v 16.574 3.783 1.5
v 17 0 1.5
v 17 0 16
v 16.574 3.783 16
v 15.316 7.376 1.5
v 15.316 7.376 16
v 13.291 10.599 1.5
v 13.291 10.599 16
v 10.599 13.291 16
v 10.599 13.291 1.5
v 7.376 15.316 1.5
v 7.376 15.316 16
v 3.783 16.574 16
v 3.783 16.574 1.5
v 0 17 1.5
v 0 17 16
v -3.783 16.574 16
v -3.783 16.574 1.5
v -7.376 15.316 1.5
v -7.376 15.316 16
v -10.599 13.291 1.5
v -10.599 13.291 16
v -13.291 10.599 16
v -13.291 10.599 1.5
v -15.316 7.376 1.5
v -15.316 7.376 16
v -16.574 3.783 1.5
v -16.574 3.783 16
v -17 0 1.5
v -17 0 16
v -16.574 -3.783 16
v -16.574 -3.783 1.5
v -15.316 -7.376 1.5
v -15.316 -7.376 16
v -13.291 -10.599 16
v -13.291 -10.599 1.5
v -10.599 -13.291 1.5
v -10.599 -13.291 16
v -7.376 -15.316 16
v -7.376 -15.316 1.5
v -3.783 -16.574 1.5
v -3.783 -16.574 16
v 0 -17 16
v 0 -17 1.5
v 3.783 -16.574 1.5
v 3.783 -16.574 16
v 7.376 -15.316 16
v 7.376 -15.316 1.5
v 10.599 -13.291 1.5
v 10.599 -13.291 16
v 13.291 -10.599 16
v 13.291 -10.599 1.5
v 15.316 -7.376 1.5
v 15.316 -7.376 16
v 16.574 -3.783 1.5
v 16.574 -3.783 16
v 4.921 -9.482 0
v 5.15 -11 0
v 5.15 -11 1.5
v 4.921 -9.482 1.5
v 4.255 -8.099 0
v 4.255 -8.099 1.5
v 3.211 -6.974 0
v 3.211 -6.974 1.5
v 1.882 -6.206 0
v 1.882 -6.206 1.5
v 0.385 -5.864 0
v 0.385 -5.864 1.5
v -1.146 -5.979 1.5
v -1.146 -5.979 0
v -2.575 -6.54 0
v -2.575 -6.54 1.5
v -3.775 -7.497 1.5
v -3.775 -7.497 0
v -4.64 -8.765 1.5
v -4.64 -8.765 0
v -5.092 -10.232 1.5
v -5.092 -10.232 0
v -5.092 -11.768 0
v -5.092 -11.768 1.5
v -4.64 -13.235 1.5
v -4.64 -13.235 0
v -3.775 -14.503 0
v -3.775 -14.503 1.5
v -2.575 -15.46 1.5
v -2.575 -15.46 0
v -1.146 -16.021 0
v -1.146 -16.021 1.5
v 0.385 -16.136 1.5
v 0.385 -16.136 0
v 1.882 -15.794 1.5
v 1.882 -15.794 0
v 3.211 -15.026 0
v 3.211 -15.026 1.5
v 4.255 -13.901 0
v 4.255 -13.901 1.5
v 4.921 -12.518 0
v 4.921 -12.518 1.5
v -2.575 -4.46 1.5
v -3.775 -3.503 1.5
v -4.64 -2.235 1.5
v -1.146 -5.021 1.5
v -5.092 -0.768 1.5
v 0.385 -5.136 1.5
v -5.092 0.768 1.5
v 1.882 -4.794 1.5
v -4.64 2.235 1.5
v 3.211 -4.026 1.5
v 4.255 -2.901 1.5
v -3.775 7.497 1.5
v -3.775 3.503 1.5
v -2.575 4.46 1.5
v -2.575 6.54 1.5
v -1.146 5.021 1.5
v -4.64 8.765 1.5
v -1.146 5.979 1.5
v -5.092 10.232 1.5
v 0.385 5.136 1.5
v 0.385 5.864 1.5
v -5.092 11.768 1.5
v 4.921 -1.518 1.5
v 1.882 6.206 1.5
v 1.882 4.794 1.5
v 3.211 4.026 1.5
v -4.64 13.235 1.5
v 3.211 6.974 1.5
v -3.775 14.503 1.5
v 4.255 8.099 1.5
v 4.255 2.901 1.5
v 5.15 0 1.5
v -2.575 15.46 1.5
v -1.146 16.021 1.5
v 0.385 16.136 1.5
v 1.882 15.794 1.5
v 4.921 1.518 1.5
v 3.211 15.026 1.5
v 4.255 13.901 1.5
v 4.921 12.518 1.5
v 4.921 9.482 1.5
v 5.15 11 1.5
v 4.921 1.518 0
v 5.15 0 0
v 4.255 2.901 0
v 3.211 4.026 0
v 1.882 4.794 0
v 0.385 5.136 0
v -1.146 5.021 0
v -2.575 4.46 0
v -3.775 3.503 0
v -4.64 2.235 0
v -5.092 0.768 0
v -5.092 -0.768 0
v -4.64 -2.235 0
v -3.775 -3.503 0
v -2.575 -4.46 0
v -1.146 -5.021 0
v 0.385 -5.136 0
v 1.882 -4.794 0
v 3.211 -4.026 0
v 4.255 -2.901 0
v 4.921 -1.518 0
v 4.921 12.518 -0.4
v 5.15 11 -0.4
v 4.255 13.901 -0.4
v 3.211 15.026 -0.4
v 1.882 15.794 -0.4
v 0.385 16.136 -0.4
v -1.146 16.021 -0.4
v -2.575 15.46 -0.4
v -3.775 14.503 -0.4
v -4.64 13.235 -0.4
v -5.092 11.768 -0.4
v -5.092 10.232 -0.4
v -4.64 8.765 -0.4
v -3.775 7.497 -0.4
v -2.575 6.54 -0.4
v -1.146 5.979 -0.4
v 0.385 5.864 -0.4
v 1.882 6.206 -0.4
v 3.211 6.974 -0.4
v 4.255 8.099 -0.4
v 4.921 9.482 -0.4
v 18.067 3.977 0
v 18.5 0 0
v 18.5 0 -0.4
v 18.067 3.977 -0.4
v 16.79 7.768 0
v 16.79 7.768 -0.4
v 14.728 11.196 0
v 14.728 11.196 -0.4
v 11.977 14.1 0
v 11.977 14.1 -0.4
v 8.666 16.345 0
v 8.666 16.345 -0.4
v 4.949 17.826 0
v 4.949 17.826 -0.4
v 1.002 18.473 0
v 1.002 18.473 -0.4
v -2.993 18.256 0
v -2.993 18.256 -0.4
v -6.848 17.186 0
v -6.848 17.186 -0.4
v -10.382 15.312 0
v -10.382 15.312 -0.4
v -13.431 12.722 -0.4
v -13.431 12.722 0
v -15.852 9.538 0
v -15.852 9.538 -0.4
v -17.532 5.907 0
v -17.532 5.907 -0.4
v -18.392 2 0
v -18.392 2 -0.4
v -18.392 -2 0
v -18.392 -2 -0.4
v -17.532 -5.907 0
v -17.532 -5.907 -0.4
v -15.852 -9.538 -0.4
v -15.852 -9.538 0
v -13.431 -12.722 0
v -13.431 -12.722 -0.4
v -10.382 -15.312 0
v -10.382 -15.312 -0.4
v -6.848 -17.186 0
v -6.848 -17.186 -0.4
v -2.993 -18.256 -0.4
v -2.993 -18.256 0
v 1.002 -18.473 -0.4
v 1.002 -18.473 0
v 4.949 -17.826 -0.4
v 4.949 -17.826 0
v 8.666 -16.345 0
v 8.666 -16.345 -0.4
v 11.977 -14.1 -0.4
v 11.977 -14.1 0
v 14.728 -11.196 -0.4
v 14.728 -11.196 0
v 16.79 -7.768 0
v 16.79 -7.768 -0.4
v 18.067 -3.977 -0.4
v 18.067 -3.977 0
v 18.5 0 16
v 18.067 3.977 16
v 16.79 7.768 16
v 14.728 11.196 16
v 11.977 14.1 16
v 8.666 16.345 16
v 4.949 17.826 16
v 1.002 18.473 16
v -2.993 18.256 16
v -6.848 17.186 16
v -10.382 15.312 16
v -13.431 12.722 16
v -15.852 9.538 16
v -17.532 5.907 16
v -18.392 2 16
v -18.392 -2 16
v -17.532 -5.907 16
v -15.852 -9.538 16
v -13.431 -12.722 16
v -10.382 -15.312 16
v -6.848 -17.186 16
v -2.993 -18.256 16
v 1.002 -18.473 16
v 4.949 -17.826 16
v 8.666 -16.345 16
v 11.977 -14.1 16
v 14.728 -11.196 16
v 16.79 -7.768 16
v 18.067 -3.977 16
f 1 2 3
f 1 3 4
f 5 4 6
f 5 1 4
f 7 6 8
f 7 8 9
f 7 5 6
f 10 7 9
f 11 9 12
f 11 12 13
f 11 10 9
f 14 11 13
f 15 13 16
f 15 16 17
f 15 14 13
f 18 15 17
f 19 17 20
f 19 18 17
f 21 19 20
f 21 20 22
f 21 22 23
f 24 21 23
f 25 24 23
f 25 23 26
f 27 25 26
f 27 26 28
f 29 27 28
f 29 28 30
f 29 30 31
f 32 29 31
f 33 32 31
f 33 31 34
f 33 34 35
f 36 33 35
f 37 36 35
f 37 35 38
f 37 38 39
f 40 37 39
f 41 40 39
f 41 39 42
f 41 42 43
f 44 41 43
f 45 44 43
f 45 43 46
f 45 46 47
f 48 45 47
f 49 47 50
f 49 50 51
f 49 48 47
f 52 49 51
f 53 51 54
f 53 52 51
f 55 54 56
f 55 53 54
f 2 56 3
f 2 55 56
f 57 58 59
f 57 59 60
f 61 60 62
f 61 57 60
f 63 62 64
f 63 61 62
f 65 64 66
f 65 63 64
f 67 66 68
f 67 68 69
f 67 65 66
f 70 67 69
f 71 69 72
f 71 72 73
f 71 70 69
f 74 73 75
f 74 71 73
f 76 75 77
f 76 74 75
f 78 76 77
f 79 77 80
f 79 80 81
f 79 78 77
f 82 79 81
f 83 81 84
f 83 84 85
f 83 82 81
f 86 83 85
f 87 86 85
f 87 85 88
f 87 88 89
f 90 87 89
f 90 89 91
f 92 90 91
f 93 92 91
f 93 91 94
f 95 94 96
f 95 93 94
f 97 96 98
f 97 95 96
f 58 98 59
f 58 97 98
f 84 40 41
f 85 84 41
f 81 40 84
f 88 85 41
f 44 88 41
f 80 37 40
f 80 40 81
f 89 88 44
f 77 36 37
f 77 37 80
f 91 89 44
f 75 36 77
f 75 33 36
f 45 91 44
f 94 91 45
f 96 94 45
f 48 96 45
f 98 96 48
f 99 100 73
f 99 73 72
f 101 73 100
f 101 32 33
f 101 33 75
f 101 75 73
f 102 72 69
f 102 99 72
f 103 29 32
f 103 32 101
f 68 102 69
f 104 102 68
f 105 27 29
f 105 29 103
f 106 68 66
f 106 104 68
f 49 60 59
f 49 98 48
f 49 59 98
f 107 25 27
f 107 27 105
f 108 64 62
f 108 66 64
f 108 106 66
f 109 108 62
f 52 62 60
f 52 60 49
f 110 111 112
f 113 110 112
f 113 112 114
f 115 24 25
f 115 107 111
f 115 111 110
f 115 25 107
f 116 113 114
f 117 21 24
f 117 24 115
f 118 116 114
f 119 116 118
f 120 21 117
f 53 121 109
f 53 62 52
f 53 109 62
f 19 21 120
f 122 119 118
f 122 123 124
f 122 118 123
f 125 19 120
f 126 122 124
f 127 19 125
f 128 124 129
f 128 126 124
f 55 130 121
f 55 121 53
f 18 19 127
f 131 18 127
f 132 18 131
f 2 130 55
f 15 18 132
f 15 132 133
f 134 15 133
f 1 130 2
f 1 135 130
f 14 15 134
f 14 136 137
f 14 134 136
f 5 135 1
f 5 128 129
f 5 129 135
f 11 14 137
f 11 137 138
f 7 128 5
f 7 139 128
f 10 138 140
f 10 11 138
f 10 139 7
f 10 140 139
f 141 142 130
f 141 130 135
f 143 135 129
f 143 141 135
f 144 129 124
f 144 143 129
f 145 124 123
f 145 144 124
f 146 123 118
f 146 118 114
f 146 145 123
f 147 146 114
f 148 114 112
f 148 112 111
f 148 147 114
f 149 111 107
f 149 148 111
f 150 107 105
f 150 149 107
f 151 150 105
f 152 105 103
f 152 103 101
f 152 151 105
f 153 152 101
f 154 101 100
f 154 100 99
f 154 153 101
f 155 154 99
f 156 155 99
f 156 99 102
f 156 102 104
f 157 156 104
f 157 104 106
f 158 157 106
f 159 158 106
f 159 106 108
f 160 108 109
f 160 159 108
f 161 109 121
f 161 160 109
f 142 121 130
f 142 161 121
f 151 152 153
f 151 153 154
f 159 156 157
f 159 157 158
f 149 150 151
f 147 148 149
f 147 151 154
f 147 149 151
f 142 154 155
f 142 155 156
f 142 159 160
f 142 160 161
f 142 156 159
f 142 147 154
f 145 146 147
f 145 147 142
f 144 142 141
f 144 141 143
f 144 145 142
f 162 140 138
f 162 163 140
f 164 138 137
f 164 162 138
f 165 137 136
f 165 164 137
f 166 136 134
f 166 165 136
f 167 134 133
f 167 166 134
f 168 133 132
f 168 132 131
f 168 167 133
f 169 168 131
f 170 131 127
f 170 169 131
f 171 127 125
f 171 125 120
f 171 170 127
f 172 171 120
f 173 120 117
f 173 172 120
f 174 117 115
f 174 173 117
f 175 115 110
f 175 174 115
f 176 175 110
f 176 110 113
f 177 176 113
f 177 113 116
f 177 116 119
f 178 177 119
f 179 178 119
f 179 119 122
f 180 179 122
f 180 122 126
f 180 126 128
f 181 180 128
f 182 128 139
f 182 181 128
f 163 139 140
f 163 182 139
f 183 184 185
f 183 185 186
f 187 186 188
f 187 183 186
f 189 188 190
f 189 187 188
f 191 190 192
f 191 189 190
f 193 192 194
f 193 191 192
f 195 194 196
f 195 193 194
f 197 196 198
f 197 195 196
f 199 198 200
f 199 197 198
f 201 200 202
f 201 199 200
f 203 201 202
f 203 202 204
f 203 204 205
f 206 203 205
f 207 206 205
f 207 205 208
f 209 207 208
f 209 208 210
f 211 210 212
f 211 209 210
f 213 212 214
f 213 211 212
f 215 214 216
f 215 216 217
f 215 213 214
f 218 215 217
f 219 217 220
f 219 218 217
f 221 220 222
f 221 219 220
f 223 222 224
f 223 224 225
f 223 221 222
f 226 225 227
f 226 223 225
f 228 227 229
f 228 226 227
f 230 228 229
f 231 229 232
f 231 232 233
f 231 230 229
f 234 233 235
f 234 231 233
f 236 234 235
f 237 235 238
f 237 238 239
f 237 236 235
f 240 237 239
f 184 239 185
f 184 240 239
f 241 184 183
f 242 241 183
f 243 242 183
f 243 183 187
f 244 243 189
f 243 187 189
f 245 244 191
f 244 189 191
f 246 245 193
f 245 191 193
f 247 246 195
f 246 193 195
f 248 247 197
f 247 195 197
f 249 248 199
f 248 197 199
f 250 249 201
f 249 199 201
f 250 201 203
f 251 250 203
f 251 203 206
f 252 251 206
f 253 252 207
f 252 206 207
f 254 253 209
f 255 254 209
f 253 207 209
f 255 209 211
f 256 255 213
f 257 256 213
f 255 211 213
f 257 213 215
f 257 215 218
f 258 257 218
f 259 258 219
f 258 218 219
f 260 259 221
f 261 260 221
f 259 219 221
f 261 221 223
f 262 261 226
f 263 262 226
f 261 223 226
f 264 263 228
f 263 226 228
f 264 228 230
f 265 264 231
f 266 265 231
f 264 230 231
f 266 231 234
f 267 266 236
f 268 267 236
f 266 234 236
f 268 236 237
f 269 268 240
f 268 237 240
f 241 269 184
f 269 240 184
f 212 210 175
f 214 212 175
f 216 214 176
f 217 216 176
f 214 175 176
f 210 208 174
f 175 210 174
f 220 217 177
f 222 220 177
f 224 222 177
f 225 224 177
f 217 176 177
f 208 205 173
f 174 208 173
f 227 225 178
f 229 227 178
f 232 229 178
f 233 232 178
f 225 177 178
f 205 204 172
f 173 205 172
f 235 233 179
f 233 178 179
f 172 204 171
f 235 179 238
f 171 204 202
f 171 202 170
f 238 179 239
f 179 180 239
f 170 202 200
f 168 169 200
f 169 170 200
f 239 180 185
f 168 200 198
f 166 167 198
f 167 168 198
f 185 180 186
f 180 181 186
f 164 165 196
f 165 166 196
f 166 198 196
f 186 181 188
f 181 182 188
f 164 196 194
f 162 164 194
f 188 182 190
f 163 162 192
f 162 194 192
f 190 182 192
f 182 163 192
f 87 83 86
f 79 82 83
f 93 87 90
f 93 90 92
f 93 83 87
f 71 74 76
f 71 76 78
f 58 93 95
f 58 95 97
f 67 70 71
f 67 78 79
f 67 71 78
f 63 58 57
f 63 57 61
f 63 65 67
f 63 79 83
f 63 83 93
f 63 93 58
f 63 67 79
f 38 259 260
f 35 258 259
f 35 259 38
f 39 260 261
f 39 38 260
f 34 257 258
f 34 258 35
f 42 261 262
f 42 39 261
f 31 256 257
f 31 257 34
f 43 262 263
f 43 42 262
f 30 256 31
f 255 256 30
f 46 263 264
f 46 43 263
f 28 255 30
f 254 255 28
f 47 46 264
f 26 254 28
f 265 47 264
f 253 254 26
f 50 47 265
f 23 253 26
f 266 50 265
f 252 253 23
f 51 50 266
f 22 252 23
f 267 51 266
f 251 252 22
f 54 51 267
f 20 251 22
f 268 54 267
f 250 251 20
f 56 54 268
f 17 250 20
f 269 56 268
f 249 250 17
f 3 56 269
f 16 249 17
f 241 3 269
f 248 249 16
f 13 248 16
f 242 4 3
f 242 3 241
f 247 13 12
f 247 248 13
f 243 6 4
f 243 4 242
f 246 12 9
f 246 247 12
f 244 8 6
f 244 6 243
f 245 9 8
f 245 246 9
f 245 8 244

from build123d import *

# Parameters (mm, degrees)
F2_R     = 18.5
F2_R_2   = 17
F2_R_3   = 5.15
F3_DEPTH = 0.4
F4_DEPTH = 1.5
F5_DEPTH = 16


with BuildPart() as f3:
    # F2 (on Top) → F3 (new body)
    with BuildSketch(Plane.XY):
        Circle(F2_R)
        Circle(F2_R_2, mode=Mode.SUBTRACT)
        Circle(F2_R_2)
        with Locations((0, -11)):
            Circle(F2_R_3, mode=Mode.SUBTRACT)
        Circle(F2_R_3, mode=Mode.SUBTRACT)
        with Locations((0, 11)):
            Circle(F2_R_3, mode=Mode.SUBTRACT)
        Circle(F2_R_3)
        with Locations((0, -11)):
            Circle(F2_R_3)
    extrude(amount=-F3_DEPTH)

    # F2 (on Top) → F4 (join)
    with BuildSketch(Plane.XY):
        Circle(F2_R_2)
        with Locations((0, -11)):
            Circle(F2_R_3, mode=Mode.SUBTRACT)
        Circle(F2_R_3, mode=Mode.SUBTRACT)
        with Locations((0, 11)):
            Circle(F2_R_3, mode=Mode.SUBTRACT)
    extrude(amount=F4_DEPTH)

    # F2 (on Top) → F5 (join)
    with BuildSketch(Plane.XY):
        Circle(F2_R)
        Circle(F2_R_2, mode=Mode.SUBTRACT)
    extrude(amount=F5_DEPTH)


solid = f3.part
